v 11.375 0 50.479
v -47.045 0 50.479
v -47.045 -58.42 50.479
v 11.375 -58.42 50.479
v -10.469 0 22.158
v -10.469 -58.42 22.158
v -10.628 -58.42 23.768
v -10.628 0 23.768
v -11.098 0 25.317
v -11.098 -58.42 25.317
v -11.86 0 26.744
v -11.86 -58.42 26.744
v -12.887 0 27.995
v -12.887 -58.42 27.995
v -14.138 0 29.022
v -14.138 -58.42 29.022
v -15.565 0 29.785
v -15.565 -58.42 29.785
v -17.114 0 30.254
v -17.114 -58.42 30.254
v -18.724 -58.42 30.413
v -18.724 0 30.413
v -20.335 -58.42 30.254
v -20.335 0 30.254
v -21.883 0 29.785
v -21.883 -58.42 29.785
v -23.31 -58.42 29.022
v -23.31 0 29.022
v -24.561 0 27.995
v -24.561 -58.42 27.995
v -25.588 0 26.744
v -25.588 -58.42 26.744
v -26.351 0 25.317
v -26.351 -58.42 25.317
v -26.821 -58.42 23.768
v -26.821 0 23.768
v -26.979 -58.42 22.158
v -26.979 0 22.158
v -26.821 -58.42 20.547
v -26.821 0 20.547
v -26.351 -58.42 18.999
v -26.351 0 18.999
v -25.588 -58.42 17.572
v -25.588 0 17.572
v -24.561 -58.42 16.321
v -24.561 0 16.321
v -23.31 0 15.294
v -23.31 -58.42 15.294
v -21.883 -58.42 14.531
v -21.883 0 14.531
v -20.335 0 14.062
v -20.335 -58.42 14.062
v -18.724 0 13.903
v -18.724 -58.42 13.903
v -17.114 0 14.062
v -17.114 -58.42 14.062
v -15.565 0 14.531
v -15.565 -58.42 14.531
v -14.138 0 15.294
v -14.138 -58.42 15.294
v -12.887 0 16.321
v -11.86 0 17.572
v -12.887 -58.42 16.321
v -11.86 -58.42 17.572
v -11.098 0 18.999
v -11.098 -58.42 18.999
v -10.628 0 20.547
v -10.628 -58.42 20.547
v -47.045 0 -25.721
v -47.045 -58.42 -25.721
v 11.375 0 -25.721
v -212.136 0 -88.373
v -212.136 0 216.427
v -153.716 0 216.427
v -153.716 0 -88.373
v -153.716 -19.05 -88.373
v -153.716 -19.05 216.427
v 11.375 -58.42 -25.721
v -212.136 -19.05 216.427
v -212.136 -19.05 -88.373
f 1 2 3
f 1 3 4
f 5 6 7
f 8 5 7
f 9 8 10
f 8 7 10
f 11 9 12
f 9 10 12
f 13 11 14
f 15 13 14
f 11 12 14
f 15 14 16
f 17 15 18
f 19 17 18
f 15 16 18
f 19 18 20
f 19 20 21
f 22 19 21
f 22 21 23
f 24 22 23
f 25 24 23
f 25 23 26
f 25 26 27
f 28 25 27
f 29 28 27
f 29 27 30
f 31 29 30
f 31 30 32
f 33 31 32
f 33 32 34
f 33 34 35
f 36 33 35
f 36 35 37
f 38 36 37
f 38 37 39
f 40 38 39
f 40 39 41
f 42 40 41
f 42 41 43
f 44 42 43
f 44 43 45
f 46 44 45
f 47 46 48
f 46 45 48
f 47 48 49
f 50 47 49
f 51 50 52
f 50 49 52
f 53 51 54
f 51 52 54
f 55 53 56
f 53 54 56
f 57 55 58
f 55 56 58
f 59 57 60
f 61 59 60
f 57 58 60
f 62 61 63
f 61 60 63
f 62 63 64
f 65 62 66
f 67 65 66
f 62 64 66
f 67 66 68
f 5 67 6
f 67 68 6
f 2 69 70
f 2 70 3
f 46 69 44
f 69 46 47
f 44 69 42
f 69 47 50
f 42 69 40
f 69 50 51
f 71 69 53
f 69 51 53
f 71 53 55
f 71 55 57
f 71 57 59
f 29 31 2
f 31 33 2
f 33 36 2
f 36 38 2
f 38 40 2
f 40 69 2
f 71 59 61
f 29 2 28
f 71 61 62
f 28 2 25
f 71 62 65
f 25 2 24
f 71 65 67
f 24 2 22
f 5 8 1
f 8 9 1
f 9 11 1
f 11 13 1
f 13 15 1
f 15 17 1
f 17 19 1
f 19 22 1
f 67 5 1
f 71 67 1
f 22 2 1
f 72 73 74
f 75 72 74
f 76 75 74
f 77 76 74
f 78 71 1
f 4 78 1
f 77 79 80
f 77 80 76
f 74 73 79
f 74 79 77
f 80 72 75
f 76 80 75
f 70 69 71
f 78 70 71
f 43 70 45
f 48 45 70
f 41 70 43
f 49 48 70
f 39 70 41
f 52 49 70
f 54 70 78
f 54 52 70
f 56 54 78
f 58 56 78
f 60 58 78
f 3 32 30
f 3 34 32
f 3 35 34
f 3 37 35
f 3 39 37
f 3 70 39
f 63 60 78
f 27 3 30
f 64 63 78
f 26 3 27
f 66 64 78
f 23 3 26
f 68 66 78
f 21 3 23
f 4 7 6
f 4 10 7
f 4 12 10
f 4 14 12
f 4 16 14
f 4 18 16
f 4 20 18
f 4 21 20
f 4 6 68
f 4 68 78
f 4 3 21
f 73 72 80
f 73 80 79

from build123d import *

# Parameters (mm, degrees)
F0_W     = 58.42
F0_H     = 76.2
F1_DEPTH = 58.42
F2_R     = 8.255
F3_DEPTH = 58.421
F0_H_2   = 304.8
F4_DEPTH = 19.05


with BuildPart() as f1:
    # F0 (on Front) → F1 (new body)
    with BuildSketch(Plane.XZ):
        with Locations((-17.835218, 12.378907)):
            Rectangle(F0_W, F0_H)
    extrude(amount=F1_DEPTH)

    # F2 (on face) → F3 (cut, through all)
    with BuildSketch(Plane.XZ.offset(58.42)):
        with Locations((-18.724218, 22.157907)):
            Circle(F2_R)
    extrude(amount=-F3_DEPTH, mode=Mode.SUBTRACT)


with BuildPart() as f4:
    # F0 (on Front) → F4 (new body)
    with BuildSketch(Plane.XZ):
        with Locations((-182.92606, 64.027352)):
            Rectangle(F0_W, F0_H_2)
    extrude(amount=F4_DEPTH)


solid = Compound([f1.part, f4.part])
